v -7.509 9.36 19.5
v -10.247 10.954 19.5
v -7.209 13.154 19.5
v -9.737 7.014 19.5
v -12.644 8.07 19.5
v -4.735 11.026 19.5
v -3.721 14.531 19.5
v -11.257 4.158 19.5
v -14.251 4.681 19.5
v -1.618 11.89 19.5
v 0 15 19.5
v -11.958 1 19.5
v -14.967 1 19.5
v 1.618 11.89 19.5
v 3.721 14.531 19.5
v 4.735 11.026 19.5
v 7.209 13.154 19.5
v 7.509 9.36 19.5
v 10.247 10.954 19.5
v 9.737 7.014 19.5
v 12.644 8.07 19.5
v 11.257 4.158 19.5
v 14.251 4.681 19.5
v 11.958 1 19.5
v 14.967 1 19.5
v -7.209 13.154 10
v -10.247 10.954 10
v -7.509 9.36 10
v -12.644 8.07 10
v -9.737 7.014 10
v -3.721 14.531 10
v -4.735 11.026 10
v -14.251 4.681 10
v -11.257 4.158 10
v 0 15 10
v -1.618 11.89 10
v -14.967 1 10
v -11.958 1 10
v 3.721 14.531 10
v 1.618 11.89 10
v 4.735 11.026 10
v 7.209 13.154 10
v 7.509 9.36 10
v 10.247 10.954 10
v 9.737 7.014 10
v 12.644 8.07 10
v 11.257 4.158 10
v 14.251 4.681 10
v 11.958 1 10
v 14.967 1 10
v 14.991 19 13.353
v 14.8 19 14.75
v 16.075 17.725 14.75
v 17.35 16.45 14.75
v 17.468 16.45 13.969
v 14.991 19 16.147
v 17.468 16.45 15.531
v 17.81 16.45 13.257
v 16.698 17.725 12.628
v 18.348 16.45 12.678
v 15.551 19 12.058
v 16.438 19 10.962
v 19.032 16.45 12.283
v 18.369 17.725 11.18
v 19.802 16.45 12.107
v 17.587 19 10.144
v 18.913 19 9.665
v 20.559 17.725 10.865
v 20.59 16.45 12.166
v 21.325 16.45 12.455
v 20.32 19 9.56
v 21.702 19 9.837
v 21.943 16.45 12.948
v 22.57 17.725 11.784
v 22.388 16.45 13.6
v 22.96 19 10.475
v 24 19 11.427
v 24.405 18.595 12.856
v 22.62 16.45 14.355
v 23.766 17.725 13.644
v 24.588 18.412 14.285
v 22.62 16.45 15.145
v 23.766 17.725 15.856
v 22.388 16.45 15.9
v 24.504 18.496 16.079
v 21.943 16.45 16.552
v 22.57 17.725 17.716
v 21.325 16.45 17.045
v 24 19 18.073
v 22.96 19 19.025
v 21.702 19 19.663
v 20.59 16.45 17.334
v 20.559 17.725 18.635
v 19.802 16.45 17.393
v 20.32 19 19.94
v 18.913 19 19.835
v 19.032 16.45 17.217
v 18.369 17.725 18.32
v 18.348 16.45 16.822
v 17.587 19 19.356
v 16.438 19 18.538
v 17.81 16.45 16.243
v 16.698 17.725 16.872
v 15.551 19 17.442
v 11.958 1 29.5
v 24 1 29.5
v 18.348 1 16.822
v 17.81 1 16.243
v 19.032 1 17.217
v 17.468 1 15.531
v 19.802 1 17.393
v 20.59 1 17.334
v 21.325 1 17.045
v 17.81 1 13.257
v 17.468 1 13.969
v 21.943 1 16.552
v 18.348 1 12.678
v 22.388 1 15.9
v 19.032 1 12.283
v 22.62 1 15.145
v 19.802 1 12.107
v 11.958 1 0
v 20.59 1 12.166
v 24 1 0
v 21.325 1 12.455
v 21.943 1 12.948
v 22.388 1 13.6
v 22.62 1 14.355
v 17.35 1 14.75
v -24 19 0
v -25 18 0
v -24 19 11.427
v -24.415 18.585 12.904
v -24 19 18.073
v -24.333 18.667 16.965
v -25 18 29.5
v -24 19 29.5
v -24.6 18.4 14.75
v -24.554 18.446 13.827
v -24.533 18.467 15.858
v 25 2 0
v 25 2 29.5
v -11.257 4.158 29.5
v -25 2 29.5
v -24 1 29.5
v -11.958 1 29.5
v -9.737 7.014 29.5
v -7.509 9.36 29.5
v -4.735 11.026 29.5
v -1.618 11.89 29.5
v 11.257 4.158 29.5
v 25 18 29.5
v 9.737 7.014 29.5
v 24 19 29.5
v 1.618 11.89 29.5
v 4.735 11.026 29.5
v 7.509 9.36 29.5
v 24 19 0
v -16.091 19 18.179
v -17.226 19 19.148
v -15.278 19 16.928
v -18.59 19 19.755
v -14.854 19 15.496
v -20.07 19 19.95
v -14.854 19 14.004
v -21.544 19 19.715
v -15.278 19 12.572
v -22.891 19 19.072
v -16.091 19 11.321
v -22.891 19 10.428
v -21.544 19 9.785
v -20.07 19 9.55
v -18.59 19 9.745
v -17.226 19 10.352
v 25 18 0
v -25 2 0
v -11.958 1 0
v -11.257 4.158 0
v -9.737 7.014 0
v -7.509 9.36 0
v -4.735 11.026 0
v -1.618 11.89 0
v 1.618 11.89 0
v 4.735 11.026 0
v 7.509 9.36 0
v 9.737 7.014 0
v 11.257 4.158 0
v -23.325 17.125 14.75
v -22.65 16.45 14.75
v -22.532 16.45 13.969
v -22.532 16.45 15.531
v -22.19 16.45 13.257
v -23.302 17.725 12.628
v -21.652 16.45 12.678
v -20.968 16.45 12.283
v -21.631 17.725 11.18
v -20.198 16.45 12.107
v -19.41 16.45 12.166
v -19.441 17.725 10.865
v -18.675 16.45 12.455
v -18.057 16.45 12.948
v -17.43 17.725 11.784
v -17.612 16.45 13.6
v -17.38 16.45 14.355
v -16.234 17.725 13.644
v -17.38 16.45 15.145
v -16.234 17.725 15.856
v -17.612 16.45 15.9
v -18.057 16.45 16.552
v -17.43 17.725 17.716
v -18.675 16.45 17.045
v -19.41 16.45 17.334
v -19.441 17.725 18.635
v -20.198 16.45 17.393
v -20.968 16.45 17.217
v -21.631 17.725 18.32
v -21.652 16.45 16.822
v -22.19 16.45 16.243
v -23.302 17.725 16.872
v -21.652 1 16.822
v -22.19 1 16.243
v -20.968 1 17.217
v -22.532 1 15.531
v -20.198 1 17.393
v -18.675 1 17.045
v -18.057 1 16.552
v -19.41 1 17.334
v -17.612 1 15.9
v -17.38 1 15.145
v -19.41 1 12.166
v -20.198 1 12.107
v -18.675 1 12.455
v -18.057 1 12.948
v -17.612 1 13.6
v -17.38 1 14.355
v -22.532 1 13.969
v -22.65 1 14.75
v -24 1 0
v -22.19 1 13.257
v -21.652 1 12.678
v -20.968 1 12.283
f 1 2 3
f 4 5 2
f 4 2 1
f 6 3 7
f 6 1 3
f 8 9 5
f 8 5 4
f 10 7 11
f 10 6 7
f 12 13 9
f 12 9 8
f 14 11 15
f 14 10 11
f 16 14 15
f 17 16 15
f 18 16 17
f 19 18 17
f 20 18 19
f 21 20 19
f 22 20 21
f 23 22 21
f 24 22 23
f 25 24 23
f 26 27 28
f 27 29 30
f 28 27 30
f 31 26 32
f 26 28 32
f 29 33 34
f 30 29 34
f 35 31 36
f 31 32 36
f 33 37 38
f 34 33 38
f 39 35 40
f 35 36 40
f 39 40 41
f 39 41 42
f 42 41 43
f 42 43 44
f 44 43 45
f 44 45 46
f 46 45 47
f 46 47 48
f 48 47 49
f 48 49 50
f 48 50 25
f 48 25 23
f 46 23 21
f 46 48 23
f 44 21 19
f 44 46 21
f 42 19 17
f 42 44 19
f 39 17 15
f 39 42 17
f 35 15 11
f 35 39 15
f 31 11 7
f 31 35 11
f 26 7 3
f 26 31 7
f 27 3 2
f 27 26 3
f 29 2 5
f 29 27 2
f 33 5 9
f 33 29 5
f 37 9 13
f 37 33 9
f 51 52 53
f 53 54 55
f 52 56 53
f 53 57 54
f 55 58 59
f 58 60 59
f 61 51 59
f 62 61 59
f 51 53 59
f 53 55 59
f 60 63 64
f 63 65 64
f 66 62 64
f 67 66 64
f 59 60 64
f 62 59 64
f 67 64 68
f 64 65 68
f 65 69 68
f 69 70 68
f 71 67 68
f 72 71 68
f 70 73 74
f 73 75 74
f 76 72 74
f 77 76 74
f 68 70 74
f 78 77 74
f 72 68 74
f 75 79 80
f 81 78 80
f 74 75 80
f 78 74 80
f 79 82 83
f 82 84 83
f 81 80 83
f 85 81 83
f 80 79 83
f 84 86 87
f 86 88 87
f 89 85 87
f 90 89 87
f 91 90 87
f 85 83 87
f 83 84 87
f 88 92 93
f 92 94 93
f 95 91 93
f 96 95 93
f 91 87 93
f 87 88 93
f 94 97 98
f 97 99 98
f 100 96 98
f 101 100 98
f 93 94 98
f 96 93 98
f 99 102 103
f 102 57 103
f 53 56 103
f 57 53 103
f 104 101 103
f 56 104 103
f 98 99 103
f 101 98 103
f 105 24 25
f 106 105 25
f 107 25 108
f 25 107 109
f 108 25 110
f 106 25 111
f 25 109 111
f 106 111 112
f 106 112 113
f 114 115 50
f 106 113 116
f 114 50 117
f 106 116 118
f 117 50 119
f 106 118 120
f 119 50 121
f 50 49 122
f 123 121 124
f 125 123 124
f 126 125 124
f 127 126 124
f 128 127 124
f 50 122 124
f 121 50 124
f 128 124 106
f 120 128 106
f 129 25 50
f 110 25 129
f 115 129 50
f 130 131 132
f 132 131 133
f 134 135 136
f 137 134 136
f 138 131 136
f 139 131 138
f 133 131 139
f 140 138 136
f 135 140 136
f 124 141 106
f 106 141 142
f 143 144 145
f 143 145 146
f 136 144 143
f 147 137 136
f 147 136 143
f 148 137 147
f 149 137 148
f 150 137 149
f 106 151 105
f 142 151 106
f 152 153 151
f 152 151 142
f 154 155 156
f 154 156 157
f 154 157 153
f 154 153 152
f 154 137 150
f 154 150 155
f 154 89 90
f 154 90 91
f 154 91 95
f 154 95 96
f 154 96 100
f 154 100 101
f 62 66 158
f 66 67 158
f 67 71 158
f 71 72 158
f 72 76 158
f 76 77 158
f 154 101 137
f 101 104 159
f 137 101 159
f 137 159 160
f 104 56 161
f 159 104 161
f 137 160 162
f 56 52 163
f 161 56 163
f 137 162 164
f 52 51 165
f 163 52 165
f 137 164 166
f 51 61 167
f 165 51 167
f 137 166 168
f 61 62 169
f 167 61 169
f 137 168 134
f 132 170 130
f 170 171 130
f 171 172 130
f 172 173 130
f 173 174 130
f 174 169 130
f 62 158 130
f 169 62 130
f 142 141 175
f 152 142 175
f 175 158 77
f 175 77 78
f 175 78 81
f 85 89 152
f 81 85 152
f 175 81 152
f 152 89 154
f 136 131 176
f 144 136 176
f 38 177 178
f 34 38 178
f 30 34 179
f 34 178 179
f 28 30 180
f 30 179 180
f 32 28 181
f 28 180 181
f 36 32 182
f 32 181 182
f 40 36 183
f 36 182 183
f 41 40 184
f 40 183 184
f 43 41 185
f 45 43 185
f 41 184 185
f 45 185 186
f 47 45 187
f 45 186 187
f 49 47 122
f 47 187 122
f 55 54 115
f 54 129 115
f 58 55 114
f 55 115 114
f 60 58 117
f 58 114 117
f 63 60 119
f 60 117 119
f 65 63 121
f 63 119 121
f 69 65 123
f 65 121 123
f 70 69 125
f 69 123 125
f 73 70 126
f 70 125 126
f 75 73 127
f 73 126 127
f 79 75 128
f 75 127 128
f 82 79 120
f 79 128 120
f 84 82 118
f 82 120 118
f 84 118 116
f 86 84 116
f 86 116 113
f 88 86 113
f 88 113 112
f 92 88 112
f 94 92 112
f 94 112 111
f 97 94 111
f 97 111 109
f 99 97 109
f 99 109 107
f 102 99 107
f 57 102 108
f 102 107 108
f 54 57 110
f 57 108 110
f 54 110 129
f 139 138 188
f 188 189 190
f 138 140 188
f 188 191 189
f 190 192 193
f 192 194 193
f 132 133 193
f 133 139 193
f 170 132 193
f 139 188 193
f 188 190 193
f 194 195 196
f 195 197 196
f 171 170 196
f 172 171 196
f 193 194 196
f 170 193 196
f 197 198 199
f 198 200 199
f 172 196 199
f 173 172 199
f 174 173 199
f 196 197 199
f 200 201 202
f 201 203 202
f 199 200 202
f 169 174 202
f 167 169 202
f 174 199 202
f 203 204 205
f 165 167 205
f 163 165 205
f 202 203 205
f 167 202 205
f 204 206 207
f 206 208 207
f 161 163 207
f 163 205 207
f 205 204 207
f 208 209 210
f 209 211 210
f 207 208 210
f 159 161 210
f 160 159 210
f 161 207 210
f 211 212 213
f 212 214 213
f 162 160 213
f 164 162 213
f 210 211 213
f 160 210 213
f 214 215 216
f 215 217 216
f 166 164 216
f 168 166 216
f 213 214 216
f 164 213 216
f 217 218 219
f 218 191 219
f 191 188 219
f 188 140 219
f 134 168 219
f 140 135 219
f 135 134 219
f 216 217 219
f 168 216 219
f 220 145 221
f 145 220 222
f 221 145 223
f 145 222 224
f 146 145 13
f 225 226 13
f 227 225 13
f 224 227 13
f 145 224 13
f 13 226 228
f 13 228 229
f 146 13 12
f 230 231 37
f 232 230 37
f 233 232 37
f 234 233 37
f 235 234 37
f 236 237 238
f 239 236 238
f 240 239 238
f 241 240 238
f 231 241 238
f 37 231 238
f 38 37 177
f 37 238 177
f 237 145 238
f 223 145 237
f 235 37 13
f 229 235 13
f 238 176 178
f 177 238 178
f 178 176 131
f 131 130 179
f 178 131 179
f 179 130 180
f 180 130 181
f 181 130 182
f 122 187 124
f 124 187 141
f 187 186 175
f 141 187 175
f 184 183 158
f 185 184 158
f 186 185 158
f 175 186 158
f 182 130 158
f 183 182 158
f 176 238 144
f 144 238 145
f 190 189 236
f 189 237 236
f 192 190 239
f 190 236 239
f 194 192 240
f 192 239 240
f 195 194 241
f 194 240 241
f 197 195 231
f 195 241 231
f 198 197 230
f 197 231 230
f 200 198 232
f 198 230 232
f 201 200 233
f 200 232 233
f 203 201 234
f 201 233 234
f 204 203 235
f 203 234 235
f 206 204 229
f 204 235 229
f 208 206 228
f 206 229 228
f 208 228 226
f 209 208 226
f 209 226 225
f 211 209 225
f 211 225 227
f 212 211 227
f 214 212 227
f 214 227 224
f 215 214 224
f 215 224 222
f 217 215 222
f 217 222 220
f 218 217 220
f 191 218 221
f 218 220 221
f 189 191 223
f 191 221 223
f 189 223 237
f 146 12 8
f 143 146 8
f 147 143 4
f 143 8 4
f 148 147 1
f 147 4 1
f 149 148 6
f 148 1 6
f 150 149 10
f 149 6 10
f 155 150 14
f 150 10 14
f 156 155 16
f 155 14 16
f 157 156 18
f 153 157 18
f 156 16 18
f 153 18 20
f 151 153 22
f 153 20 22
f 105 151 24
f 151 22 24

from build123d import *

# Parameters (mm, degrees)
BOSS_EXTRUDE1_DEPTH         = 29.5
CHAMFER1_SIZE               = 1
SKETCH4_W                   = 10.79057785
SKETCH4_H                   = 9.5
HOLE_WIZARD_M51_D           = 5.3
HOLE_WIZARD_M51_CSINK_D     = 10.4
HOLE_WIZARD_M51_CSINK_ANGLE = 90


with BuildPart() as part:
    # Sketch2 → Boss-Extrude1 (new body)
    with BuildSketch(Plane.XY):
        with BuildLine():
            Line((11.958260743, 1), (25, 1))
            Line((25, 1), (25, 19))
            Line((25, 19), (-25, 19))
            Line((-25, 19), (-25, 1))
            Line((-25, 1), (-11.958260743, 1))
            ThreePointArc((-11.958260743, 1), (0, 12), (11.958260743, 1))
        make_face()
    extrude(amount=BOSS_EXTRUDE1_DEPTH)

    # Chamfer1
    chamfer1_edges = [part.edges().sort_by_distance(p)[0] for p in [
        (-25, 19, 14.75),
        (25, 19, 14.75),
        (25, 1, 14.75),
        (-25, 1, 14.75),
    ]]
    chamfer(chamfer1_edges, length=CHAMFER1_SIZE)

    # Sketch4 → Cut-Revolve1 (revolve, cut)
    with BuildSketch(Plane(origin=(0, 0, 0), x_dir=(-1, 0, 0), z_dir=(0, -1, 0))):
        with Locations((9.604711075, -14.75)):
            Rectangle(SKETCH4_W, SKETCH4_H)
    revolve(axis=Axis((0, 0, 0), (0, 0, 1)), mode=Mode.SUBTRACT)

    # Зенковка для  винта с плоской головкой M51 (through all)
    with Locations(Plane(origin=(0, 19, 0), x_dir=(1, 0, 0), z_dir=(0, 1, 0))):
        with Locations((-20, -14.75), (20, -14.75)):
            CounterSinkHole(HOLE_WIZARD_M51_D / 2, HOLE_WIZARD_M51_CSINK_D / 2, counter_sink_angle=HOLE_WIZARD_M51_CSINK_ANGLE)


solid = part.part
